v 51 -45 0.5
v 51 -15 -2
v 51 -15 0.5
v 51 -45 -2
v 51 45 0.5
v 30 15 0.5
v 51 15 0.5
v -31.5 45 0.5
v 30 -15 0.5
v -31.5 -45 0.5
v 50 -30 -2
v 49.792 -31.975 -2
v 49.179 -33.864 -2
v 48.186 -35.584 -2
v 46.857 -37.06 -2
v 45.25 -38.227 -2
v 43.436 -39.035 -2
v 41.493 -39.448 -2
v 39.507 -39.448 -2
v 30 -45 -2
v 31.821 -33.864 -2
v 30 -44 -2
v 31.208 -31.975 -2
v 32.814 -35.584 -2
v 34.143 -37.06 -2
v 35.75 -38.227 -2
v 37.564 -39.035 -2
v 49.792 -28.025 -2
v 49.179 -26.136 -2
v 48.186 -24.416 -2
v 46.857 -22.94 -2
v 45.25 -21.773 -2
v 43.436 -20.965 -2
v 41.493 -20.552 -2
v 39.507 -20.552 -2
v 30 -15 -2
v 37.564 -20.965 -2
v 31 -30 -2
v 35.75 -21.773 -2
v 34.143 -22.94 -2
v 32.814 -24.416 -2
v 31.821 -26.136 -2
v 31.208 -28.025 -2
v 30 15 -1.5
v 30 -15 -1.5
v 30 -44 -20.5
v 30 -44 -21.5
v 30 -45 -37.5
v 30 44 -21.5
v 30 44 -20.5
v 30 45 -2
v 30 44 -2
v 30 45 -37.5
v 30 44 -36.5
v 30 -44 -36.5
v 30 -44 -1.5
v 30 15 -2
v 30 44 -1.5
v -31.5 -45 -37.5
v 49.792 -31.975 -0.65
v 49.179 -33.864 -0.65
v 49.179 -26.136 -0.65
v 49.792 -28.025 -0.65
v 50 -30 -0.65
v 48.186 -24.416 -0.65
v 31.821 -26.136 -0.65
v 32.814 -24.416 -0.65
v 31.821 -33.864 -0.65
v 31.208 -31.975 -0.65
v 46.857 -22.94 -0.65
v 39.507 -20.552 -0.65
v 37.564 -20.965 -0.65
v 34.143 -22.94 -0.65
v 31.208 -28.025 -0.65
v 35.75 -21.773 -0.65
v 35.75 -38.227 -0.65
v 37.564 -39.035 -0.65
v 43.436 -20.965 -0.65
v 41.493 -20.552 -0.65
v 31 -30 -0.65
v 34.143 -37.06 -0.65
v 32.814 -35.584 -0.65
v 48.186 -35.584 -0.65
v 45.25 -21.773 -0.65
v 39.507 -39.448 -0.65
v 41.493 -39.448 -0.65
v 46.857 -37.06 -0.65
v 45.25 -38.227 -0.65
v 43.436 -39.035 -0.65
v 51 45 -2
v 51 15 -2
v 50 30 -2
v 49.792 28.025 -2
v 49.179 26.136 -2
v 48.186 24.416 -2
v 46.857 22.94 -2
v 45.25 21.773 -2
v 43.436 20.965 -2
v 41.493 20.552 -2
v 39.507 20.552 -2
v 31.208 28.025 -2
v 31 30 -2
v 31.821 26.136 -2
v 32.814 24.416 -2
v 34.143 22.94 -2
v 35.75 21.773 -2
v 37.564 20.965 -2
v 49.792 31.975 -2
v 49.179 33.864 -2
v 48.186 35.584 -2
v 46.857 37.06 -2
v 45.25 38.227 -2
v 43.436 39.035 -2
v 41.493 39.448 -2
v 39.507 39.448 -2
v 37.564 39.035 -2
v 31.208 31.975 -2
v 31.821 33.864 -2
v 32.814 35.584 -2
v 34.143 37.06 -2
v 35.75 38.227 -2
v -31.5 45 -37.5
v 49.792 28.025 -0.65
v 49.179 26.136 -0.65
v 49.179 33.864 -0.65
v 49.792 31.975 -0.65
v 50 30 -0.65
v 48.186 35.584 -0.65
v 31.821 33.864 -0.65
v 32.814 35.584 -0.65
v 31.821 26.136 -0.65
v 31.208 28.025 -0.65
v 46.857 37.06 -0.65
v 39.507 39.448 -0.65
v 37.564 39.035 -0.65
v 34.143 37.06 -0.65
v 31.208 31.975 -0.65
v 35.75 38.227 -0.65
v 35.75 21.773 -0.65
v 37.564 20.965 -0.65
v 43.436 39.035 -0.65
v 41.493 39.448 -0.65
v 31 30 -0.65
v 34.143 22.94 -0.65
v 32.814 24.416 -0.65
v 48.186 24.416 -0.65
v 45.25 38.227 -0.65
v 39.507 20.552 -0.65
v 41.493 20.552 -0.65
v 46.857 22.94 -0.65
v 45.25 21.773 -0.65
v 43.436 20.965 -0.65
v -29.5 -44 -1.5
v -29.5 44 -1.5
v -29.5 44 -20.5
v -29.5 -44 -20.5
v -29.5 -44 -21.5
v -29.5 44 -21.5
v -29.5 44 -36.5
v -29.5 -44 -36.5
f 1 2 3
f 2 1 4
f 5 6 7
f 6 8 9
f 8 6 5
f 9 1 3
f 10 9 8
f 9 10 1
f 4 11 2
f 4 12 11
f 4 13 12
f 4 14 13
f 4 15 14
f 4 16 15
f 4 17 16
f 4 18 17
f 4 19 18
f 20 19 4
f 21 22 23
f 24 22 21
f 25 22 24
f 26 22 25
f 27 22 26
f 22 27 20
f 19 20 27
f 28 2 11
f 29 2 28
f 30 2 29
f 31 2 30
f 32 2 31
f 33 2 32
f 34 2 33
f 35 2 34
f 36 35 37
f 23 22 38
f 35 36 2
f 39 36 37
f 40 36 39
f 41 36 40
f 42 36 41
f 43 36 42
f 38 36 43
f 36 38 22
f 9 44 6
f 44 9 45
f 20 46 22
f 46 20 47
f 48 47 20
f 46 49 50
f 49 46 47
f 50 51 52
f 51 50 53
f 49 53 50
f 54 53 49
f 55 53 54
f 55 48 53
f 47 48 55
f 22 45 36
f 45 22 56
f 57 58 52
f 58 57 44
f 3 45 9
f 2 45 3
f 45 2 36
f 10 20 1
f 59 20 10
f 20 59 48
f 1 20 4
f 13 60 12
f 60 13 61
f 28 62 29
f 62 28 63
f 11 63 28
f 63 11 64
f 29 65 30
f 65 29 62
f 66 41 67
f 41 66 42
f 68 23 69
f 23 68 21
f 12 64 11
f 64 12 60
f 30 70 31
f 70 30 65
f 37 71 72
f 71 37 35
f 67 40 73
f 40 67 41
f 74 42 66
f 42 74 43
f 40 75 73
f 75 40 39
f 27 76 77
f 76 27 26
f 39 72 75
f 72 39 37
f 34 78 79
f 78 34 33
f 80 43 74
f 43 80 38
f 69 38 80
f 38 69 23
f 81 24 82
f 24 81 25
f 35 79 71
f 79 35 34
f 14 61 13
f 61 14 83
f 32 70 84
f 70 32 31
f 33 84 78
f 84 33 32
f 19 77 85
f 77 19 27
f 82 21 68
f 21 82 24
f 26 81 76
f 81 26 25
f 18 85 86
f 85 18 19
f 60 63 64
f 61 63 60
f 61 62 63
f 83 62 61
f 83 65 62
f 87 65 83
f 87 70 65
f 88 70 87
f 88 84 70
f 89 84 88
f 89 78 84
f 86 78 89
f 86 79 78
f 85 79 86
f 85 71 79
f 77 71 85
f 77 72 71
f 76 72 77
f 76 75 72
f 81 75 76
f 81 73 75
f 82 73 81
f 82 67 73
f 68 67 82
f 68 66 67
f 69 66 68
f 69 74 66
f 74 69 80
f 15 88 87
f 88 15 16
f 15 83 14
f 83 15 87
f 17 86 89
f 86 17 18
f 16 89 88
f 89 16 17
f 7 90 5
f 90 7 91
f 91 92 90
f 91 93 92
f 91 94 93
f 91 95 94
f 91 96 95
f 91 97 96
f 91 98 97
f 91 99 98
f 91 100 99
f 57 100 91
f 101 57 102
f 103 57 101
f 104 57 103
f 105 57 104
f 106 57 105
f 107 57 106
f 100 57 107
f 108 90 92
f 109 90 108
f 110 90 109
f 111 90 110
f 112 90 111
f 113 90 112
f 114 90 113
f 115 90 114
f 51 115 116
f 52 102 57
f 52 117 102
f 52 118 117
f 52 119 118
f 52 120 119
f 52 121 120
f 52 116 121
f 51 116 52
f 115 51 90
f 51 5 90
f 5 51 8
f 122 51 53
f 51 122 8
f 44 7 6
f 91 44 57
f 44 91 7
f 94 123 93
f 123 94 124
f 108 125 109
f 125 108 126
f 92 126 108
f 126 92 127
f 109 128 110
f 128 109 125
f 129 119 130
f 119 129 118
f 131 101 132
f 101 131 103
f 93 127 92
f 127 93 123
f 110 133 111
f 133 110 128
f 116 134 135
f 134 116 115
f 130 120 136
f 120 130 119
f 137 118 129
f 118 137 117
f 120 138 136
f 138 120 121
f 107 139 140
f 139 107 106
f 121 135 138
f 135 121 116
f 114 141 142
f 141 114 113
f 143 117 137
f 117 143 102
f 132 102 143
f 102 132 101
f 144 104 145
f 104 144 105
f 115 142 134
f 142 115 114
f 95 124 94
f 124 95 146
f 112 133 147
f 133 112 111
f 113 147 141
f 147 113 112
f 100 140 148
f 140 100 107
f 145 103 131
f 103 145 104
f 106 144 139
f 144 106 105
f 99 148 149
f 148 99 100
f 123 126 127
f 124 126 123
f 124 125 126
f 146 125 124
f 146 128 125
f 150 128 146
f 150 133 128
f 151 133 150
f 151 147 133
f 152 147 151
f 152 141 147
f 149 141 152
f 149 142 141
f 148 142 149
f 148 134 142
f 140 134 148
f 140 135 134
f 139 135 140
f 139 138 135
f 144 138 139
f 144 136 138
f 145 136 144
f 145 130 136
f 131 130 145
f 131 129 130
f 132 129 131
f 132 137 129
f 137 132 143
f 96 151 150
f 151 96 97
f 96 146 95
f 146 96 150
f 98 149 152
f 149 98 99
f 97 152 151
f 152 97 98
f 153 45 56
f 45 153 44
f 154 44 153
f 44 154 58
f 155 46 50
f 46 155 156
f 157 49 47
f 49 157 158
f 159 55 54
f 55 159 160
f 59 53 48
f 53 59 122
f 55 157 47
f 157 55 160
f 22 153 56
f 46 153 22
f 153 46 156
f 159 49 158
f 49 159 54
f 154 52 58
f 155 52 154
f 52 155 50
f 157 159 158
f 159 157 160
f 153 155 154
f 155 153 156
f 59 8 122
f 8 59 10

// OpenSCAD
/*
ve verzi dva zesílená zadní stěna a obě ucha nahoře
*/
drzak_na_fixy();

module drzak_na_fixy() {
color ("Blue", alpha=0.8) translate([0,0,-0.5]) rotate([0,0,0]) cube(size=[60,90,2], center=true); //zada
color ("RoyalBlue", alpha=0.7) translate([0,0,-21]) rotate([0,0,0]) cube(size=[60,90,1], center=true); //prepazka
color ("RoyalBlue", alpha=0.6) translate([0,0,-37]) rotate([0,0,0]) cube(size=[60,90,1], center=true); //predni strana
color ("Green", alpha=0.8) translate([0,-44.5,-37/2]) rotate([0,0,0]) cube(size=[60,1,37], center=true); //L bok
color ("Green", alpha=0.8) translate([0,44.5,-37/2]) rotate([0,0,0]) cube(size=[60,1,37], center=true); //P bok
color ("Magenta", alpha=0.8) translate([-30.5,0,-37/2]) rotate([0,0,0]) cube(size=[2,90,38], center=true); //dno

color ("Gray", alpha=0.8) translate(/*[-30+9.5,-44.5-11,-0.75]*/[30+21/2,-45/2-15/2,-0.75]) difference(){
    cube(size=[21,30,2.5], center=true);
    translate ([0,0,-1.4]) cylinder(h=3, r=9.5, center=true);
    } //L magnet
color ("Gray", alpha=0.8) translate(/*[-30+9.5,44.5+11,-0.75]*/[30+21/2,+45/2+15/2,-0.75]) difference(){
    cube(size=[21,30,2.5], center=true);
    translate ([0,0,-1.4]) cylinder(h=3, r=9.5, center=true);
    } //R magnet
}
